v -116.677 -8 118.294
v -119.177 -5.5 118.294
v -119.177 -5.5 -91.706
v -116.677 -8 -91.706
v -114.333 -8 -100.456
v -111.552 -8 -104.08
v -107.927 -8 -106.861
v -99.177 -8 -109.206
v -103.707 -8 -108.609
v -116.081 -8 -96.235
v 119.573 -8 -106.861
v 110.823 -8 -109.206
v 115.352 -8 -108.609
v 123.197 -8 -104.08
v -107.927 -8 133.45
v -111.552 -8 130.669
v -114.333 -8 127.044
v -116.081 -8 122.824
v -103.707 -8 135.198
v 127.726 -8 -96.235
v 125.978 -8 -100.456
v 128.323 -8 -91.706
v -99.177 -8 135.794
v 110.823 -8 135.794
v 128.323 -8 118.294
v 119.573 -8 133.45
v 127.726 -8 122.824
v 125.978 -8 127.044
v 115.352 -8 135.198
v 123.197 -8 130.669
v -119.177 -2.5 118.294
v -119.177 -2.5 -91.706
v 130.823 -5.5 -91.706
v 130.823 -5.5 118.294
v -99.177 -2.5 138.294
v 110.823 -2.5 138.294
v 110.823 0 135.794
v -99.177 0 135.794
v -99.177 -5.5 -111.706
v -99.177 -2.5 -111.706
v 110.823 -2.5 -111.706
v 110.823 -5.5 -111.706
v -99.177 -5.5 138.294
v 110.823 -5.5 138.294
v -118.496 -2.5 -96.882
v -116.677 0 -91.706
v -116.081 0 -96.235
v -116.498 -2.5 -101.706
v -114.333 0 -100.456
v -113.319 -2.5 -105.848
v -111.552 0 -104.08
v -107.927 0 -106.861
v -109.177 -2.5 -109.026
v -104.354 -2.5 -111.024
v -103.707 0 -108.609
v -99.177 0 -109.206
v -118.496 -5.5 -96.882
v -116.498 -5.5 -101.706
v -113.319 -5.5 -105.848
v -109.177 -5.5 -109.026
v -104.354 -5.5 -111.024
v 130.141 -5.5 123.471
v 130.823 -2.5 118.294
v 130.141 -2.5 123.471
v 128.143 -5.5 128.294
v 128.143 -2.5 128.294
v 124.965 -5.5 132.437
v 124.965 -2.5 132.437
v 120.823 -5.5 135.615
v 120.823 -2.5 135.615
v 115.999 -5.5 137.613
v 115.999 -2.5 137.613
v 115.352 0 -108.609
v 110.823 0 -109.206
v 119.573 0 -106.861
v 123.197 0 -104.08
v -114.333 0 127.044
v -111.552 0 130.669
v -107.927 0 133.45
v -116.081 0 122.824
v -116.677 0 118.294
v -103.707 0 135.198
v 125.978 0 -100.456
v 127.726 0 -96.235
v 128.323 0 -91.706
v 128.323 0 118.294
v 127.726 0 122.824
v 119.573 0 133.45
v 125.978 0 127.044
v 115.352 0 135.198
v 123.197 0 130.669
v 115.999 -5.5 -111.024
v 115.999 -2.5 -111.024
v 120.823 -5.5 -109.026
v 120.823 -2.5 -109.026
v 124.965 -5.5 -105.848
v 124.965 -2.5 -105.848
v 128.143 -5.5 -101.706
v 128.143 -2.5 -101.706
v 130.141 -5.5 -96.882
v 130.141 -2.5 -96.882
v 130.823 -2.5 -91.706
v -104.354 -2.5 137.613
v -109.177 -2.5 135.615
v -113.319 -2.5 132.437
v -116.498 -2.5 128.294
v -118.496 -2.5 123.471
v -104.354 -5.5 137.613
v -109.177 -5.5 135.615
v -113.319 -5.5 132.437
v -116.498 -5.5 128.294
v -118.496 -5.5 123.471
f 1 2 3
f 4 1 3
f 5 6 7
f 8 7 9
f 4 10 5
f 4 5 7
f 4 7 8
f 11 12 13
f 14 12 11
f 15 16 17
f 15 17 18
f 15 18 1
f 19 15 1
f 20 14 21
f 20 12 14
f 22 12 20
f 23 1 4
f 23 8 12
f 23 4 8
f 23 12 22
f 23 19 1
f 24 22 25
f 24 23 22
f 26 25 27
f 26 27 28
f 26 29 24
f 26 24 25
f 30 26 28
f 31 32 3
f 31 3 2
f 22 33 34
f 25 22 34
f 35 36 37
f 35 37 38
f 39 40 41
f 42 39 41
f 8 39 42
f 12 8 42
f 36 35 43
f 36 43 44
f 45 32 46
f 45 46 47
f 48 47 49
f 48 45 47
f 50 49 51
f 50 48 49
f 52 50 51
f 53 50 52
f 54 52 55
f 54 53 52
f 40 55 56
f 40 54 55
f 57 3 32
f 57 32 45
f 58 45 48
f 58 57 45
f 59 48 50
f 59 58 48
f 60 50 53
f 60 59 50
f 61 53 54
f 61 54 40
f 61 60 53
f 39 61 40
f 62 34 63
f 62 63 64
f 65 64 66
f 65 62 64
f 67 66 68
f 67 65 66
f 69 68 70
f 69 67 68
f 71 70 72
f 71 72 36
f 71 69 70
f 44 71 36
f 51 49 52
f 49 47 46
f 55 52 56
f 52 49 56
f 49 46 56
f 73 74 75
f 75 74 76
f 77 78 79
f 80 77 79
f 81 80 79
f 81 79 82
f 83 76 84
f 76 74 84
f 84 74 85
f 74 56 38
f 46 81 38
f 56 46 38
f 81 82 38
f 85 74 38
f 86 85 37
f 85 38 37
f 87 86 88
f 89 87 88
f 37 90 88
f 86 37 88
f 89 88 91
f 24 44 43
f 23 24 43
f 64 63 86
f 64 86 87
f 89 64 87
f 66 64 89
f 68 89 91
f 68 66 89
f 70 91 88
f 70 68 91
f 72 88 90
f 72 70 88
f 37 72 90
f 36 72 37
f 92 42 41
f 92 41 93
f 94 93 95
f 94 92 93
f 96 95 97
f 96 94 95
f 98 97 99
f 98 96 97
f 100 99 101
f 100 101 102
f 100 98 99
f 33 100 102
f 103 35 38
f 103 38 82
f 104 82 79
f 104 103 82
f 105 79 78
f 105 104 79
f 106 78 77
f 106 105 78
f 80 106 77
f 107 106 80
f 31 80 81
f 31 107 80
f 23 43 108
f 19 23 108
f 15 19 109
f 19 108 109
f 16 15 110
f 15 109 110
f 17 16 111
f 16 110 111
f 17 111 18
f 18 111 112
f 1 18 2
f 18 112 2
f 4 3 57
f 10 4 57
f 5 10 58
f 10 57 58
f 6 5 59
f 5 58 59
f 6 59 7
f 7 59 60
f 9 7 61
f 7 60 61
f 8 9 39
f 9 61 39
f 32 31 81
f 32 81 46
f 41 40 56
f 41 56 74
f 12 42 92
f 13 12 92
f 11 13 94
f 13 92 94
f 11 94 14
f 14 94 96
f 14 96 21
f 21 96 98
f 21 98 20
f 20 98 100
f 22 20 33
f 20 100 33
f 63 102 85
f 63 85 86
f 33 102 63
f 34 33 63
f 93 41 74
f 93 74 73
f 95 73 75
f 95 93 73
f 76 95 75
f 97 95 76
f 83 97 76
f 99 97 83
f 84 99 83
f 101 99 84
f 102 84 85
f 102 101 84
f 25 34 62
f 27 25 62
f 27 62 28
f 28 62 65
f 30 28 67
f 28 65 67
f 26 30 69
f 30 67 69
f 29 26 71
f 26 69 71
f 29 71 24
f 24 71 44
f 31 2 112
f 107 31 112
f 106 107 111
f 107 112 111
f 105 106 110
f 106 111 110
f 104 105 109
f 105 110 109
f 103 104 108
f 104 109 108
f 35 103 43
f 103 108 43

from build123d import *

# Parameters (mm, degrees)
F0_W     = 250
F0_H     = 250
F1_DEPTH = 8
F2_R     = 20
F3_SIZE  = 2.5


with BuildPart() as f1:
    # F0 (on Front) → F1 (new body)
    with BuildSketch(Plane.XZ):
        with Locations((5.8226548135, 13.2943871957)):
            Rectangle(F0_W, F0_H)
    extrude(amount=F1_DEPTH)

    # F2
    f2_edges = [f1.edges().sort_by_distance(p)[0] for p in [
        (-119.177345, -4, -111.705613),
        (130.822655, -4, -111.705613),
        (130.822655, -4, 138.294387),
        (-119.177345, -4, 138.294387),
    ]]
    fillet(f2_edges, radius=F2_R)

    # F3
    f3_edges = [f1.edges().sort_by_distance(p)[0] for p in [
        (5.822655, 0, -111.705613),
        (-113.319481, 0, -105.847748),
        (-119.177345, 0, 13.294387),
        (-113.319481, 0, 132.436523),
        (5.822655, 0, 138.294387),
        (124.96479, 0, 132.436523),
        (124.96479, 0, -105.847748),
        (130.822655, 0, 13.294387),
        (124.96479, -8, -105.847748),
        (5.822655, -8, -111.705613),
    ]]
    chamfer(f3_edges, length=F3_SIZE)


solid = f1.part
